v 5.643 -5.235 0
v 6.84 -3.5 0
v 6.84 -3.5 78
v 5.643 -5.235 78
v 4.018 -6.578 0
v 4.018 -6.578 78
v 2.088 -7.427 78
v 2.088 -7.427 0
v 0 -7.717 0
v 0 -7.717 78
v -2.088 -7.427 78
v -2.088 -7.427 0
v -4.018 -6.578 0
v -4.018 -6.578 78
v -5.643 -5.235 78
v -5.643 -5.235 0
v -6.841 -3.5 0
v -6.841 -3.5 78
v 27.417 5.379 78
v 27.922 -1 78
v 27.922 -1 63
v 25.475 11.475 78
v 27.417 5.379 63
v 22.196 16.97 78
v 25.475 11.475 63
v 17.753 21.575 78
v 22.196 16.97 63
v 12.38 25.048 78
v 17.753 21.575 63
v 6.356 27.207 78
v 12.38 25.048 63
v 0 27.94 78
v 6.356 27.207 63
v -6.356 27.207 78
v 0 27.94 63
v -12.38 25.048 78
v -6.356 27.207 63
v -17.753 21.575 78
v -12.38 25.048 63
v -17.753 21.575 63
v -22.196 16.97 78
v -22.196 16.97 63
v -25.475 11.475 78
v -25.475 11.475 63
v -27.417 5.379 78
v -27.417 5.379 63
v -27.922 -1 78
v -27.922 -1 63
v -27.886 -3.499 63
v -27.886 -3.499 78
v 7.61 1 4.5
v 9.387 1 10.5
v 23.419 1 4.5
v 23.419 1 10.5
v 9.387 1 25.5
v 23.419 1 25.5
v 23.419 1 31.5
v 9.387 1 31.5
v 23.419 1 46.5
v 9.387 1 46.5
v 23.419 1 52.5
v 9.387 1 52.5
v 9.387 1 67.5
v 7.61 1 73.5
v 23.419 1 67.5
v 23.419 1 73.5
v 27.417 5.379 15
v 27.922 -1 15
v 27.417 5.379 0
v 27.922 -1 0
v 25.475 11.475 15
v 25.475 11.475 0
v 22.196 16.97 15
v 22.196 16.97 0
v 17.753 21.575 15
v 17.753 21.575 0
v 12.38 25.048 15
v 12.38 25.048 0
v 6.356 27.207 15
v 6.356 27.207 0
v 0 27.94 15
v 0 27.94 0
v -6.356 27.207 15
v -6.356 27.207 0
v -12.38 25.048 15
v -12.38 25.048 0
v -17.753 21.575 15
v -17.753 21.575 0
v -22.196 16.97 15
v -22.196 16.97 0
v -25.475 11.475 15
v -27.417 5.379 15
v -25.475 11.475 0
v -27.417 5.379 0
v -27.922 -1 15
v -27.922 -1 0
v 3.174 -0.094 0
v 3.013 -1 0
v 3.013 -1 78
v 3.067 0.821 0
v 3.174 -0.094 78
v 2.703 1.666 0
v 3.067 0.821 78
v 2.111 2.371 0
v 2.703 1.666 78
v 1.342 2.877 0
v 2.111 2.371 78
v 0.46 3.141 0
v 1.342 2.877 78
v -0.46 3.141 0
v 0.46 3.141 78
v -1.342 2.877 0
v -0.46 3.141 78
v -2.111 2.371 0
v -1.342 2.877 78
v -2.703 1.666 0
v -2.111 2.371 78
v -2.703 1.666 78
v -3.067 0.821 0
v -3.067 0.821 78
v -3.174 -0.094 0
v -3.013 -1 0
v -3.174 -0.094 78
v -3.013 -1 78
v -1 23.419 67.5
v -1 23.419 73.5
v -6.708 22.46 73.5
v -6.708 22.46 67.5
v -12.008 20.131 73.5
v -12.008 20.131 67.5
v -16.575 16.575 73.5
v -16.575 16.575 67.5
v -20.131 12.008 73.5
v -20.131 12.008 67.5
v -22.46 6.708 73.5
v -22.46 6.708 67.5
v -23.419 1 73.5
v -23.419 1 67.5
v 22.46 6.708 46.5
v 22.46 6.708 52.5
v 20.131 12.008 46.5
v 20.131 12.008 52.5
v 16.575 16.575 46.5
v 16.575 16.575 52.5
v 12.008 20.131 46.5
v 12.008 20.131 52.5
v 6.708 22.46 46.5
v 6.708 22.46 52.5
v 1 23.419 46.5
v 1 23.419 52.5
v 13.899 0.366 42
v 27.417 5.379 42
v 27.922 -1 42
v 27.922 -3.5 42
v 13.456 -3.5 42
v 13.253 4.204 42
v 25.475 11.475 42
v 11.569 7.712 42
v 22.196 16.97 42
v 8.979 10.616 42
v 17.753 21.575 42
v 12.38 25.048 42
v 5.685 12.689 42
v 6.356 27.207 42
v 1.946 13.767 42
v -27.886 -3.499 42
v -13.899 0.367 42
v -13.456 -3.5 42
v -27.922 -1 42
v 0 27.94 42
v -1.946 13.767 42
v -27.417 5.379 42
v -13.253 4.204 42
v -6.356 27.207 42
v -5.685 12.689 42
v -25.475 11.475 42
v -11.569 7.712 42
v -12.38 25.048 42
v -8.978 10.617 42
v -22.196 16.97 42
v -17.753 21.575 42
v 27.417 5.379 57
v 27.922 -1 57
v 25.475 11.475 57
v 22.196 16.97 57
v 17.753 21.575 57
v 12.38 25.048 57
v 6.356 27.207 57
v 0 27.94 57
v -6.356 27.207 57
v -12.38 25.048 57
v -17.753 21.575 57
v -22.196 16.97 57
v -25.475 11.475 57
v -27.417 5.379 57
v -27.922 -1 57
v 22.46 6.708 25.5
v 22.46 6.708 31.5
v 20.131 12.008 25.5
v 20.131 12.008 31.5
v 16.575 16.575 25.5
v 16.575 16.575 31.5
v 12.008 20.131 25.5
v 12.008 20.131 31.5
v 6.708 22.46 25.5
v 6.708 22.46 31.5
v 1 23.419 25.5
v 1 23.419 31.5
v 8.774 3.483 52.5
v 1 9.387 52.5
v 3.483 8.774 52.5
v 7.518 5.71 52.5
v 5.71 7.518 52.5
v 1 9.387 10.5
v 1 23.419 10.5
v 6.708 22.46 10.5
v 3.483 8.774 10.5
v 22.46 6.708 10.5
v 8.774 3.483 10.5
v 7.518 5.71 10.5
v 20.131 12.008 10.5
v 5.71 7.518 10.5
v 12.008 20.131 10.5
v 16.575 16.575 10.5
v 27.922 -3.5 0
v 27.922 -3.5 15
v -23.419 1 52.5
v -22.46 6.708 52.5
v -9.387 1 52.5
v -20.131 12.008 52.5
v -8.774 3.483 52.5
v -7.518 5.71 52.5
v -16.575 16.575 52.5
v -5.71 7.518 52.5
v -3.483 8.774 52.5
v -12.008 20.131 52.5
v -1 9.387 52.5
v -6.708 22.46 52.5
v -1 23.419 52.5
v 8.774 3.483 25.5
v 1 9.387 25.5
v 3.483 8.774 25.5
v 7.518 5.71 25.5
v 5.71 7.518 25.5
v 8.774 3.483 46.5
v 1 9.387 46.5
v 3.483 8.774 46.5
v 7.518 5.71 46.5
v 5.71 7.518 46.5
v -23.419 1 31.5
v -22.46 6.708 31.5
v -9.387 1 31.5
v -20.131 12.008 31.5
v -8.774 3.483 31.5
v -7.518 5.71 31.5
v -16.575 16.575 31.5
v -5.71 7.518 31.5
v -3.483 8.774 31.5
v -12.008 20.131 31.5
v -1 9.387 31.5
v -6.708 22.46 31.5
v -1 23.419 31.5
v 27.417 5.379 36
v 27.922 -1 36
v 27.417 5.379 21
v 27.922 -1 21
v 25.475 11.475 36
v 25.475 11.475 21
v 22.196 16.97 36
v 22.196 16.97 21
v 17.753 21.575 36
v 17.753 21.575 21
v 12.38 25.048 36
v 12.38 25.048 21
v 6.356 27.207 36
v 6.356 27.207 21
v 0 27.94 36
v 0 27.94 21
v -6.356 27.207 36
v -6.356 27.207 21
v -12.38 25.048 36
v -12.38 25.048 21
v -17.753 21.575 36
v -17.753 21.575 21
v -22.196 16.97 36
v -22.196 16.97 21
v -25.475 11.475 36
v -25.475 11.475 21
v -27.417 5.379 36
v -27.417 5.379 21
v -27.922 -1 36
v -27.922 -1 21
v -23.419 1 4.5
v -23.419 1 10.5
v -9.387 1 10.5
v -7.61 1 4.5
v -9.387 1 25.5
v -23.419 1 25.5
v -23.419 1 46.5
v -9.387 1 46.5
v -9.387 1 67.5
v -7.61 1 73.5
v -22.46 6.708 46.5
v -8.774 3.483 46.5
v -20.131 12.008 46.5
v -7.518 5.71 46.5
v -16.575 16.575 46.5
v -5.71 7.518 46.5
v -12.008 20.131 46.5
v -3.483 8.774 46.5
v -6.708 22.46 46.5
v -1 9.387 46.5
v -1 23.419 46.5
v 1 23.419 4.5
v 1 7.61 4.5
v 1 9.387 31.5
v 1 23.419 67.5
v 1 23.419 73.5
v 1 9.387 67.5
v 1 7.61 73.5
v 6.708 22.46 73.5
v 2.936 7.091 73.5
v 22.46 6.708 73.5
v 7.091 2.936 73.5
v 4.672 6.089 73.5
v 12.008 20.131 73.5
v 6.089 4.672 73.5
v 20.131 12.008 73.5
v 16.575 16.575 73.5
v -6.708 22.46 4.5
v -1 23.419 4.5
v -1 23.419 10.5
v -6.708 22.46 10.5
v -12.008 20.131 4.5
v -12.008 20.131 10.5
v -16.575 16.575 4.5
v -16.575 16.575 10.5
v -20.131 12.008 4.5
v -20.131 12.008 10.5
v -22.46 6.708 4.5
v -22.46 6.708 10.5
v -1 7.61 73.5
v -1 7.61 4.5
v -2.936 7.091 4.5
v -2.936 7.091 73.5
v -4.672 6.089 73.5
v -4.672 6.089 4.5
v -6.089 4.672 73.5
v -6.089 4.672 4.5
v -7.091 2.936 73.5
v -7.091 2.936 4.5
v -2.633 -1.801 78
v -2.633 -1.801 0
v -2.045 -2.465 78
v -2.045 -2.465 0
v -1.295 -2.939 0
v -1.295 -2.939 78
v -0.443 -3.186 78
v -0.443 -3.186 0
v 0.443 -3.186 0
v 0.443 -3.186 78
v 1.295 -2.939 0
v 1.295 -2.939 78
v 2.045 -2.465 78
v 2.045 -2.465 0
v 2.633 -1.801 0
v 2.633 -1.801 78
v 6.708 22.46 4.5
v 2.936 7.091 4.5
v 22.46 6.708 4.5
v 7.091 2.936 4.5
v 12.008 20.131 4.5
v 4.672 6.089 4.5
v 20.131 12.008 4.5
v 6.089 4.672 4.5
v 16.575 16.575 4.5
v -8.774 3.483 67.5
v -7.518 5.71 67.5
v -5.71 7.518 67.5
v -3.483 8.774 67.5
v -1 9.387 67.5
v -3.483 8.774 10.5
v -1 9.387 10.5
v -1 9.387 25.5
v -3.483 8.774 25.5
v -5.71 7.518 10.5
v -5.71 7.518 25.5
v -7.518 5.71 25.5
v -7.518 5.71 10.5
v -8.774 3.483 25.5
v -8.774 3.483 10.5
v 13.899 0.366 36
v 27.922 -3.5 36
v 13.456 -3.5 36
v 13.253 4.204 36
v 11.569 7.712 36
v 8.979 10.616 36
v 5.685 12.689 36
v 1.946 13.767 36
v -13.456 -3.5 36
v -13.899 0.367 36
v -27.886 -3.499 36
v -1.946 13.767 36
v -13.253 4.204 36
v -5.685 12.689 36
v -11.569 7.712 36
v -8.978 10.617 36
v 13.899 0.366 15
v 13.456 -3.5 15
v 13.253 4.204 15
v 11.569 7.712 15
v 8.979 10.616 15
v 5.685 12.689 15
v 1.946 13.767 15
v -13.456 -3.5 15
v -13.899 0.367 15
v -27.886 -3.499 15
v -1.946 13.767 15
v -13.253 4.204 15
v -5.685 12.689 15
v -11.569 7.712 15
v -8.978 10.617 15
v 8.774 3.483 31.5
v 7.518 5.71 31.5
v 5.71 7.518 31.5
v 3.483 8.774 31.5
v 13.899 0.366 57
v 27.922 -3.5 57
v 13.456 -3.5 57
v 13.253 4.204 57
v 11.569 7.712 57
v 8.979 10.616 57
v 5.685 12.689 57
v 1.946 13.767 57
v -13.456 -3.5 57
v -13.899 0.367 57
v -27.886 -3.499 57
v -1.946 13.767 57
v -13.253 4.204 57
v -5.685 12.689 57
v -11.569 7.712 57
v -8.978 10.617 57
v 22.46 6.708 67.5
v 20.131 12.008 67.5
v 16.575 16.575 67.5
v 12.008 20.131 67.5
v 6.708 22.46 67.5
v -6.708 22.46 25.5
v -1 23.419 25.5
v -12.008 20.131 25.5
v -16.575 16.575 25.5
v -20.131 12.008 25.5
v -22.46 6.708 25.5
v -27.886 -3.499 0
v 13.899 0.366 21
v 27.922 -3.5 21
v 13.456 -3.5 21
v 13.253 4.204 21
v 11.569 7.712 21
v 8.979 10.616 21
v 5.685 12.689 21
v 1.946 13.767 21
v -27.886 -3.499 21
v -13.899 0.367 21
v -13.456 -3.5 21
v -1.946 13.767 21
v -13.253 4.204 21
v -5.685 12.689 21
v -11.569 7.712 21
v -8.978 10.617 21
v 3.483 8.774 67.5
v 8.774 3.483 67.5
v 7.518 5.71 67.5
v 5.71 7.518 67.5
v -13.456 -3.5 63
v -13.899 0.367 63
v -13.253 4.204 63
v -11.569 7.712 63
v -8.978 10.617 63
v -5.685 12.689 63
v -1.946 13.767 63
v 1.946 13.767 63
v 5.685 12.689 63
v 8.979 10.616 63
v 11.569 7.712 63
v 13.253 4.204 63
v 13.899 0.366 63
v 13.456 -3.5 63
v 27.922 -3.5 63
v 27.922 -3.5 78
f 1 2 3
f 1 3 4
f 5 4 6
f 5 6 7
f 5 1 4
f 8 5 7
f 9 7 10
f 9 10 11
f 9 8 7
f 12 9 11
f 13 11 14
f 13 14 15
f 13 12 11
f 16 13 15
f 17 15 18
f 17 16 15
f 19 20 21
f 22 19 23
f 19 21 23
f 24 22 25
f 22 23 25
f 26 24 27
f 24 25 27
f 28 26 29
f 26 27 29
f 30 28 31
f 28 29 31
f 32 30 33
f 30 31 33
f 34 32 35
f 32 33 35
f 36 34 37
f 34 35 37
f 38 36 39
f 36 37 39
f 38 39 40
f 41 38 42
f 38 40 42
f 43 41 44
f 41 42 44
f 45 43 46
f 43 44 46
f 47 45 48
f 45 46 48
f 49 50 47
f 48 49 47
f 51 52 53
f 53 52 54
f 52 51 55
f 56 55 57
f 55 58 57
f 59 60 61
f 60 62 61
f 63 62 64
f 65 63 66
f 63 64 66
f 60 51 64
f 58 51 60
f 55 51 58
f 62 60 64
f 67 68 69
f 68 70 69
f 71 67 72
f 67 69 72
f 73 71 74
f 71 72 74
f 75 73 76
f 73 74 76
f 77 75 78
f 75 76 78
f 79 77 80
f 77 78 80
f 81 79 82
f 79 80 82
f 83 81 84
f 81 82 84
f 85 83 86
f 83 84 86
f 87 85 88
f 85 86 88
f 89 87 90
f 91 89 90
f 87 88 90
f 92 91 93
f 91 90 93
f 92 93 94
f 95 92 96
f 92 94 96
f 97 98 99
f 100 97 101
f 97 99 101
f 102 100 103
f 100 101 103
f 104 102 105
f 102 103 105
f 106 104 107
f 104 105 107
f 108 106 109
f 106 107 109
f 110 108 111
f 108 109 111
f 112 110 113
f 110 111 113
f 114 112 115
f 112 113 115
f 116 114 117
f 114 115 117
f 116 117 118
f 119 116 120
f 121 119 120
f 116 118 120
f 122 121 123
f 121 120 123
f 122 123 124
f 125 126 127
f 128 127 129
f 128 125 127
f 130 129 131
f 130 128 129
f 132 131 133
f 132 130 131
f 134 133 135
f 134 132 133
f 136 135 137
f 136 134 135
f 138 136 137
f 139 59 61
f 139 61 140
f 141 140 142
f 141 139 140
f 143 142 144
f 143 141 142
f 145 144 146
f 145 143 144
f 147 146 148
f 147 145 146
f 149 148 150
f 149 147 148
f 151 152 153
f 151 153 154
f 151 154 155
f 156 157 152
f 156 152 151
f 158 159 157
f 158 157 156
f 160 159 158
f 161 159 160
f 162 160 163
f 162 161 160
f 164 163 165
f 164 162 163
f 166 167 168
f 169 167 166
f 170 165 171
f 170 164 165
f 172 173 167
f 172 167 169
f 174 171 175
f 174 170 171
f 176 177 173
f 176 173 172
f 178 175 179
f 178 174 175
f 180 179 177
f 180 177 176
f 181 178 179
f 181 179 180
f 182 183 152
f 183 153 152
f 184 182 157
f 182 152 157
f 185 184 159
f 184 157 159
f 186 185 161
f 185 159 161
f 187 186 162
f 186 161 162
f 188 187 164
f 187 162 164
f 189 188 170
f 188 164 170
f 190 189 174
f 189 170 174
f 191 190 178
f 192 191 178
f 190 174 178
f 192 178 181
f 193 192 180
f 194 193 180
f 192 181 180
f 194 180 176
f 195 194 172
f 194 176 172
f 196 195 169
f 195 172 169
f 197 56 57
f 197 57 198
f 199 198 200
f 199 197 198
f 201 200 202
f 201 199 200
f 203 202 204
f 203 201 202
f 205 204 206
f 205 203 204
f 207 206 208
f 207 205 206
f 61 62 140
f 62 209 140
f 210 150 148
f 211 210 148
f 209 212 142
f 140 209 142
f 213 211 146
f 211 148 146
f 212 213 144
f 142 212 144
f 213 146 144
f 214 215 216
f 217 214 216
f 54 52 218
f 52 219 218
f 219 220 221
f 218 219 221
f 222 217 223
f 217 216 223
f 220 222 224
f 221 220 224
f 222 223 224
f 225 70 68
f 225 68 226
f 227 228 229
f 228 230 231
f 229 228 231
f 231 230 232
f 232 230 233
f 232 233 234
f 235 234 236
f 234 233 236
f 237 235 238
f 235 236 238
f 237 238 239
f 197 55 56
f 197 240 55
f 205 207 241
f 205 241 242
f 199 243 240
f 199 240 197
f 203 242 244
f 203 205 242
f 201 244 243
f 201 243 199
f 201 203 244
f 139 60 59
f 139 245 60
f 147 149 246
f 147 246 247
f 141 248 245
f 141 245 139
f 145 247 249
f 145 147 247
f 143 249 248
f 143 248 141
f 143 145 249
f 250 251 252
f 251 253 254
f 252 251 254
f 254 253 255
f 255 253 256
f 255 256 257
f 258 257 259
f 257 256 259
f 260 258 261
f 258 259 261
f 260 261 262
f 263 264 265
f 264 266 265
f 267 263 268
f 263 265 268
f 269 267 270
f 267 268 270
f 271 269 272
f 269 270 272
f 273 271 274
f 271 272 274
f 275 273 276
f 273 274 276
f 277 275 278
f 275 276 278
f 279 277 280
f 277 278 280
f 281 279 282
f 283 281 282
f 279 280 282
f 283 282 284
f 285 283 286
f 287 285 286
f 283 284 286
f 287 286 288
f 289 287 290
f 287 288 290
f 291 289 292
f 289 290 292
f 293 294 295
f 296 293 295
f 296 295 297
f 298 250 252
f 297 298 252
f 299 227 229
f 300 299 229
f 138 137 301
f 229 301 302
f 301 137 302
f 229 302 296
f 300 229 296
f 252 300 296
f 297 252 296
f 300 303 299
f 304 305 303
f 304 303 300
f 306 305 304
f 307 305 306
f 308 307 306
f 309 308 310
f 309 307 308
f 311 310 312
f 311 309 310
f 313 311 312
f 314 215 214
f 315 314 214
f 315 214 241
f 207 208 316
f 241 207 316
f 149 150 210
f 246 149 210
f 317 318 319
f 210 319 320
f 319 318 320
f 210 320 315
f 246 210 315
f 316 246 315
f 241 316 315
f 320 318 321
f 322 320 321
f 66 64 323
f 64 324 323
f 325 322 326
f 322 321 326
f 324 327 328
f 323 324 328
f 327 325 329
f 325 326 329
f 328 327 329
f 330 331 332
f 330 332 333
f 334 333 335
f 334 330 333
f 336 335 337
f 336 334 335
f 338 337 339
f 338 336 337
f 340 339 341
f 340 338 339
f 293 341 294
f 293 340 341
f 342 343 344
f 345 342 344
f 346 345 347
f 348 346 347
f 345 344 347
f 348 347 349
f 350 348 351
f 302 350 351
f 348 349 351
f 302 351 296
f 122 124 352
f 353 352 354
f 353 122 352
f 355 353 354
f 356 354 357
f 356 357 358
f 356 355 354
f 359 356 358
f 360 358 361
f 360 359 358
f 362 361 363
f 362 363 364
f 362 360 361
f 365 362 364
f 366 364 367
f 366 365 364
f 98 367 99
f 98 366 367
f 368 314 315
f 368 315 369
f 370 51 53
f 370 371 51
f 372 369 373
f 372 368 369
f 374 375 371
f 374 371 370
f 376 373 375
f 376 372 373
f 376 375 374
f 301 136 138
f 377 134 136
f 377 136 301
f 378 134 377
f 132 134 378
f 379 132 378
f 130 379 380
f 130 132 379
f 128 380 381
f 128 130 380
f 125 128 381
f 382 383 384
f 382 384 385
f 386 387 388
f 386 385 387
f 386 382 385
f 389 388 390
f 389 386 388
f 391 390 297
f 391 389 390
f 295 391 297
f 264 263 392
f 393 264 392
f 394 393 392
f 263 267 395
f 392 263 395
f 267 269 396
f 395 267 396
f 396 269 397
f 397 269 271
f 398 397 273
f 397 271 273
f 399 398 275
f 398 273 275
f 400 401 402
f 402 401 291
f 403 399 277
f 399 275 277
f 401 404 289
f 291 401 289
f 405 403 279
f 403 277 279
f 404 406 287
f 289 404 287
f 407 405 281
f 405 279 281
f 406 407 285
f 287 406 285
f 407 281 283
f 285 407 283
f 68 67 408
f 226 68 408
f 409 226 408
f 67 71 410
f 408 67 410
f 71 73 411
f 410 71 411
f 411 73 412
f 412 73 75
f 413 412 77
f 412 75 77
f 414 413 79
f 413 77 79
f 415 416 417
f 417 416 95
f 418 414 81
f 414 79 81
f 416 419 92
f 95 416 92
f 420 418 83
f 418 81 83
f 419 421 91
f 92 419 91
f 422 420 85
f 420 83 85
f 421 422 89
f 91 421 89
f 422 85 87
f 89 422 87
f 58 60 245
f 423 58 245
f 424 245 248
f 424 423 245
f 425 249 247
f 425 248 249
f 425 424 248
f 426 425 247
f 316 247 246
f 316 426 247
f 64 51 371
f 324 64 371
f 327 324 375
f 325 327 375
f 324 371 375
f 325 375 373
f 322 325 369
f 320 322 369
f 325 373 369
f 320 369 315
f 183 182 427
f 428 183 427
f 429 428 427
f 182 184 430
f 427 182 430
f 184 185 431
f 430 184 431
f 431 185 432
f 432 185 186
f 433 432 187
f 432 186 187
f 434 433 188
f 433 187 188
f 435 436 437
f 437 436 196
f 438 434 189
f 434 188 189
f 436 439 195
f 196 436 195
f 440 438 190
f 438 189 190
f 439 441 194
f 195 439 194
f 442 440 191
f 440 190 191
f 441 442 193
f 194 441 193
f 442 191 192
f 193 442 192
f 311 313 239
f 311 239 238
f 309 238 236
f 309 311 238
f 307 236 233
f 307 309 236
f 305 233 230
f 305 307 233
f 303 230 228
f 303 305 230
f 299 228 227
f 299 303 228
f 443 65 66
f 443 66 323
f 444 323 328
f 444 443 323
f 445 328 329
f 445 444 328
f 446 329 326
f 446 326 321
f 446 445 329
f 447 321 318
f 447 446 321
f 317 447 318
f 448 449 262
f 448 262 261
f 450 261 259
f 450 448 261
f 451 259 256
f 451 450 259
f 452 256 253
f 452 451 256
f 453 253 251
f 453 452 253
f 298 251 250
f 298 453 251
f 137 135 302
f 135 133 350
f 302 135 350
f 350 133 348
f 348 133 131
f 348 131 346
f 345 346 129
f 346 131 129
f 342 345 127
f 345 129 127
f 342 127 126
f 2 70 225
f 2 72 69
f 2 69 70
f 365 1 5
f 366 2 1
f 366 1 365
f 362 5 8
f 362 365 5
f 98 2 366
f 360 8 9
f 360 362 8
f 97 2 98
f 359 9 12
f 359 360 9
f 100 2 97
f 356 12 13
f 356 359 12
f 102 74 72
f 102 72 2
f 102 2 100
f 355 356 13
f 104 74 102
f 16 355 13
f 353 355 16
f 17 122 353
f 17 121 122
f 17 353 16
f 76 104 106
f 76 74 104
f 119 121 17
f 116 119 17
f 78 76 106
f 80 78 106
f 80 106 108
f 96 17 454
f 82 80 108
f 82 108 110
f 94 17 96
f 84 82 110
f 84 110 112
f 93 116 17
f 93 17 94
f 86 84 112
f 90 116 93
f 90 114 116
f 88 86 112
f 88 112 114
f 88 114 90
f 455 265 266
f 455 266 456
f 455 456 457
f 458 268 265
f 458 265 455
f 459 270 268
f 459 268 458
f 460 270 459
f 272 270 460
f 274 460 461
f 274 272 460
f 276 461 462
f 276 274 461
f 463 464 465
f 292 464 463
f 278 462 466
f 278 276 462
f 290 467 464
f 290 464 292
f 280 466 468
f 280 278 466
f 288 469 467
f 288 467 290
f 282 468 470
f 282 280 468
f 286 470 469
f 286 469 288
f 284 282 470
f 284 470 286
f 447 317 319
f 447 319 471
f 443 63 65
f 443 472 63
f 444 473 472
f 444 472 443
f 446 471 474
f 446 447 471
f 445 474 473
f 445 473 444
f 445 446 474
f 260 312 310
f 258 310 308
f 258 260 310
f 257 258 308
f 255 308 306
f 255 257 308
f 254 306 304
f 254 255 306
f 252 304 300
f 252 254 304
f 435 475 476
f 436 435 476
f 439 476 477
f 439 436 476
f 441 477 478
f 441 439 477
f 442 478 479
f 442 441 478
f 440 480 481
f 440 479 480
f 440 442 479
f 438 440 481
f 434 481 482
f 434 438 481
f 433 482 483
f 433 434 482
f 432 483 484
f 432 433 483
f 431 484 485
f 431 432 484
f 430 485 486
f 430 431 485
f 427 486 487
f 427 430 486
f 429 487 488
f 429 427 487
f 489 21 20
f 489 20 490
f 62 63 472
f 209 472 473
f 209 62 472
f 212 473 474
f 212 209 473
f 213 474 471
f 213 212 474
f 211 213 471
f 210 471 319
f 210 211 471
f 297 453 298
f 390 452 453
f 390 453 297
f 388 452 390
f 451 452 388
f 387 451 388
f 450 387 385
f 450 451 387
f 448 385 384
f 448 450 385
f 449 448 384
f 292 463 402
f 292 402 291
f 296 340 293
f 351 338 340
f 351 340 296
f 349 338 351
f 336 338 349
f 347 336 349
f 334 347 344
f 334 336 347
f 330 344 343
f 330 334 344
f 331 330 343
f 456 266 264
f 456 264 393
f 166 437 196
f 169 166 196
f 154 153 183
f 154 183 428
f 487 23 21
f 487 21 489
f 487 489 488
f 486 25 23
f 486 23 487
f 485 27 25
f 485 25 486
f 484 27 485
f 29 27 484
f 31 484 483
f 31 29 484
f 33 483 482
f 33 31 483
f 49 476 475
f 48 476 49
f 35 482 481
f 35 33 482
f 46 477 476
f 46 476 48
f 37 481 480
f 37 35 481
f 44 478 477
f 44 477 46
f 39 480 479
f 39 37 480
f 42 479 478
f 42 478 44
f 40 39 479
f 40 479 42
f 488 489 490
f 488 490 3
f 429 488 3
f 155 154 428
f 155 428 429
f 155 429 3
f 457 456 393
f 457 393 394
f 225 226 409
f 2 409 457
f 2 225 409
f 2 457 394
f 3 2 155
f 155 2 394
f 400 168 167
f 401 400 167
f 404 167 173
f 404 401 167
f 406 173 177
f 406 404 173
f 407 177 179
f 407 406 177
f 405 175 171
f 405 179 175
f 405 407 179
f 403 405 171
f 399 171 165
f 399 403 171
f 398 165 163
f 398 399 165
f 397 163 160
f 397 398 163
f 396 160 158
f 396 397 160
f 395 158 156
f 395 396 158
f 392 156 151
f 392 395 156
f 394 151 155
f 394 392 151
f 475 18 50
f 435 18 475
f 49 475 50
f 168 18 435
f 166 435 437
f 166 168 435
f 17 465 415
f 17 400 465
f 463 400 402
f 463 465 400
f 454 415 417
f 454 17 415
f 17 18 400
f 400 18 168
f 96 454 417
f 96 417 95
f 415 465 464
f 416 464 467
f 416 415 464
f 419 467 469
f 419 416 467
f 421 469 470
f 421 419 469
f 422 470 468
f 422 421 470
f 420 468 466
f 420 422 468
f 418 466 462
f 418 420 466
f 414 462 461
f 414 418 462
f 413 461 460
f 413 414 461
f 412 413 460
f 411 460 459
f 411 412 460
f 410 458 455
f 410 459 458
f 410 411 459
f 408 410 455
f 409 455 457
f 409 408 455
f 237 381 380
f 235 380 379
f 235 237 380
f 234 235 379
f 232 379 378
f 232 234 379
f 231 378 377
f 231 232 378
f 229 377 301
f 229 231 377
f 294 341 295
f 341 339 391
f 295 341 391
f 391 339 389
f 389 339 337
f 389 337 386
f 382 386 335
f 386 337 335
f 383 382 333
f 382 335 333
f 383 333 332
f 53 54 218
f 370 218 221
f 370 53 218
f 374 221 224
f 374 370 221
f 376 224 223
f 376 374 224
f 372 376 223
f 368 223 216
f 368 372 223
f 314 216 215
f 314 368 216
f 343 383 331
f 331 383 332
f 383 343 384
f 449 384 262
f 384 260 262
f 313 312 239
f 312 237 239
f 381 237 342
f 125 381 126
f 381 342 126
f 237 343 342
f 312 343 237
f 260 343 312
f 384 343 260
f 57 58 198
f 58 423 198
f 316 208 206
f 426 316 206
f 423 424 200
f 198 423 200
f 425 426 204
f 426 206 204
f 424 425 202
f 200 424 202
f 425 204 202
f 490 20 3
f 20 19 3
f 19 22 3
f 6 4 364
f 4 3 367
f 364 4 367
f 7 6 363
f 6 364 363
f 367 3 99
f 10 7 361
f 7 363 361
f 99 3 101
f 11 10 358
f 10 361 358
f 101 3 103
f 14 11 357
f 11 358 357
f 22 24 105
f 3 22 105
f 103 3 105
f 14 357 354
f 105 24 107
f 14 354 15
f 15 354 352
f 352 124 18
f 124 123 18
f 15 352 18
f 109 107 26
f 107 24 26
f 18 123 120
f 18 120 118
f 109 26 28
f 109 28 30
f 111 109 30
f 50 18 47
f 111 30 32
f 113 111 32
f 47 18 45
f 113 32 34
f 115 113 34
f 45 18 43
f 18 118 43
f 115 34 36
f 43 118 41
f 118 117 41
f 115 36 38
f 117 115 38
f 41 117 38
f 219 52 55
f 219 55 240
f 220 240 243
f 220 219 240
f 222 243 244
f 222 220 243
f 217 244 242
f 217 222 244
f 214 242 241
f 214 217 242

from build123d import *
from build123d.topology import SkipClean

# Parameters (mm, degrees)
SKETCH3_R            = 27.94
BOSS_EXTRUDE2_DEPTH  = 78
SKETCH5_R            = 3.175
CUT_EXTRUDE1_DEPTH   = 88.437332988
SKETCH4_W            = 14
SKETCH4_H            = 6
SHELL1_START         = 4.5
SHELL1_OUTLINE_R     = 23.44
SHELL1_OUTLINE_R_2   = 7.675
SHELL1_DEPTH         = 6
SHELL1_START_2       = 25.5
SHELL1_2_OUTLINE_R   = 23.44
SHELL1_2_OUTLINE_R_2 = 7.675
SHELL1_2_DEPTH       = 6
SHELL1_START_3       = 46.5
SHELL1_3_OUTLINE_R   = 23.44
SHELL1_3_OUTLINE_R_2 = 7.675
SHELL1_3_DEPTH       = 6
SHELL1_START_4       = 67.5
SHELL1_4_OUTLINE_R   = 23.44
SHELL1_4_OUTLINE_R_2 = 7.675
SHELL1_4_DEPTH       = 6
SHELL1_START_5       = 10.5
SHELL1_5_OUTLINE_R   = 9.44
SHELL1_5_OUTLINE_R_2 = 7.675
SHELL1_5_DEPTH       = 57
BOSS_EXTRUDE3_START  = -73.5
BOSS_EXTRUDE3_DEPTH  = 69
CUT_EXTRUDE3_DEPTH   = 78
BOSS_EXTRUDE5_DEPTH  = 78
SKETCH13_W           = 16.483162312
SKETCH13_H           = 6


# Read off the part's stored shape, not the designer's step: Shell1, Boss-Extrude3
with BuildPart() as part:
    # Sketch3 → Boss-Extrude2 (new body)
    with BuildSketch(Plane.XY):
        Circle(SKETCH3_R)
    extrude(amount=BOSS_EXTRUDE2_DEPTH)

    # Sketch5 → Cut-Extrude1 (cut, through all)
    with BuildSketch(Plane.XY.offset(78)):
        Circle(SKETCH5_R)
    extrude(amount=-CUT_EXTRUDE1_DEPTH, mode=Mode.SUBTRACT)

    # Sketch4 → Cut-Revolve1 (revolve, cut)
    with BuildSketch(Plane(origin=(0, 0, 0), x_dir=(1, 0, 0), z_dir=(0, 1, 0)), mode=Mode.PRIVATE) as cut_revolve1_sk:
        with Locations((-20.94, -60)):
            Rectangle(SKETCH4_W, SKETCH4_H)
        with Locations((-20.94, -39)):
            Rectangle(SKETCH4_W, SKETCH4_H)
        with Locations((-20.94, -18)):
            Rectangle(SKETCH4_W, SKETCH4_H)
    revolve(cut_revolve1_sk.sketch.rotate(Axis((0, 0, 78), (0, 0, -1)), 180), axis=Axis((0, 0, 78), (0, 0, -1)), mode=Mode.SUBTRACT)

    # Shell1 outline → Shell1 (cut)
    with BuildSketch(Plane.XY.offset(SHELL1_START)):
        Circle(SHELL1_OUTLINE_R)
        Circle(SHELL1_OUTLINE_R_2, mode=Mode.SUBTRACT)
    extrude(amount=SHELL1_DEPTH, mode=Mode.SUBTRACT)

    # Shell1 2 outline → Shell1 2 (cut)
    with BuildSketch(Plane.XY.offset(SHELL1_START_2)):
        Circle(SHELL1_2_OUTLINE_R)
        Circle(SHELL1_2_OUTLINE_R_2, mode=Mode.SUBTRACT)
    extrude(amount=SHELL1_2_DEPTH, mode=Mode.SUBTRACT)

    # Shell1 3 outline → Shell1 3 (cut)
    with BuildSketch(Plane.XY.offset(SHELL1_START_3)):
        Circle(SHELL1_3_OUTLINE_R)
        Circle(SHELL1_3_OUTLINE_R_2, mode=Mode.SUBTRACT)
    extrude(amount=SHELL1_3_DEPTH, mode=Mode.SUBTRACT)

    # Shell1 4 outline → Shell1 4 (cut)
    with BuildSketch(Plane.XY.offset(SHELL1_START_4)):
        Circle(SHELL1_4_OUTLINE_R)
        Circle(SHELL1_4_OUTLINE_R_2, mode=Mode.SUBTRACT)
    extrude(amount=SHELL1_4_DEPTH, mode=Mode.SUBTRACT)

    # Shell1 5 outline → Shell1 5 (cut)
    with BuildSketch(Plane.XY.offset(SHELL1_START_5)):
        Circle(SHELL1_5_OUTLINE_R)
        Circle(SHELL1_5_OUTLINE_R_2, mode=Mode.SUBTRACT)
    extrude(amount=SHELL1_5_DEPTH, mode=Mode.SUBTRACT)

    # Boss-Extrude3 outline → Boss-Extrude3 (add)
    with SkipClean():  # the faces are left unmerged after this step: merging them gives an invalid solid
        with BuildSketch(Plane(origin=(0, 0, 0), x_dir=(-1, 0, 0), z_dir=(0, 0, -1)).offset(BOSS_EXTRUDE3_START)):
            with BuildLine():
                ThreePointArc((27.922098775, -1), (27.94, 0), (27.922098775, 1))
                Line((27.922098775, 1), (7.609574561, 1))
                ThreePointArc((7.609574561, 1), (7.675, 0), (7.609574561, -1))
                Line((7.609574561, -1), (27.922098775, -1))
            make_face()
            with BuildLine():
                ThreePointArc((1, 27.922098775), (0, 27.94), (-1, 27.922098775))
                Line((-1, 27.922098775), (-1, 7.609574561))
                ThreePointArc((-1, 7.609574561), (0, 7.675), (1, 7.609574561))
                Line((1, 7.609574561), (1, 27.922098775))
            make_face()
            with BuildLine():
                ThreePointArc((-1, -27.922098775), (0, -27.94), (1, -27.922098775))
                Line((1, -27.922098775), (1, -7.609574561))
                ThreePointArc((1, -7.609574561), (0, -7.675), (-1, -7.609574561))
                Line((-1, -7.609574561), (-1, -27.922098775))
            make_face()
            with BuildLine():
                ThreePointArc((-27.922098775, 1), (-27.94, 0), (-27.922098775, -1))
                Line((-27.922098775, -1), (-7.609574561, -1))
                ThreePointArc((-7.609574561, -1), (-7.675, 0), (-7.609574561, 1))
                Line((-7.609574561, 1), (-27.922098775, 1))
            make_face()
        extrude(amount=BOSS_EXTRUDE3_DEPTH)

    # Sketch16 → Cut-Extrude3 (cut)
    with SkipClean():  # the faces are left unmerged after this step: merging them gives an invalid solid
        with BuildSketch(Plane(origin=(0, 0, 0), x_dir=(-1, 0, 0), z_dir=(0, 0, -1))):
            with BuildLine():
                Line((-3.01340754, -1), (-27.922098775, -1))
                ThreePointArc((-27.922098775, -1), (0, -27.94), (27.922098775, -1))
                Line((27.922098775, -1), (3.01340754, -1))
                ThreePointArc((3.01340754, -1), (0, -3.175), (-3.01340754, -1))
            make_face()
        extrude(amount=-CUT_EXTRUDE3_DEPTH, mode=Mode.SUBTRACT)

    # Sketch18 → Boss-Extrude5 (add)
    with SkipClean():  # the faces are left unmerged after this step: merging them gives an invalid solid
        with BuildSketch(Plane(origin=(0, 0, 0), x_dir=(-1, 0, 0), z_dir=(0, 0, -1))):
            with BuildLine():
                Line((-3.01340754, -1), (-27.922098775, -1))
                Line((-27.922098775, -1), (-27.922098775, -3.5))
                Line((-27.922098775, -3.5), (-6.840431771, -3.5))
                ThreePointArc((-6.840431771, -3.5), (0.000223346, -7.717020739), (6.840632422, -3.49960091))
                Line((6.840632422, -3.49960091), (27.886307794, -3.499359298))
                Line((27.886307794, -3.499359298), (27.922098775, -1))
                Line((27.922098775, -1), (3.01340754, -1))
                ThreePointArc((3.01340754, -1), (0, -3.217020742), (-3.01340754, -1))
            make_face()
        extrude(amount=-BOSS_EXTRUDE5_DEPTH)

    # Sketch13 → Cut-Revolve2 (revolve, cut)
    with BuildSketch(Plane(origin=(0, 0, 0), x_dir=(1, 0, 0), z_dir=(0, 1, 0))):
        with Locations((-22.145666886, -39)):
            Rectangle(SKETCH13_W, SKETCH13_H)
        with Locations((-22.145666886, -18)):
            Rectangle(SKETCH13_W, SKETCH13_H)
        with Locations((-22.145666886, -60)):
            Rectangle(SKETCH13_W, SKETCH13_H)
    revolve(axis=Axis((0, 0, 77.128746248), (0, 0, -1)), mode=Mode.SUBTRACT)


solid = part.part
